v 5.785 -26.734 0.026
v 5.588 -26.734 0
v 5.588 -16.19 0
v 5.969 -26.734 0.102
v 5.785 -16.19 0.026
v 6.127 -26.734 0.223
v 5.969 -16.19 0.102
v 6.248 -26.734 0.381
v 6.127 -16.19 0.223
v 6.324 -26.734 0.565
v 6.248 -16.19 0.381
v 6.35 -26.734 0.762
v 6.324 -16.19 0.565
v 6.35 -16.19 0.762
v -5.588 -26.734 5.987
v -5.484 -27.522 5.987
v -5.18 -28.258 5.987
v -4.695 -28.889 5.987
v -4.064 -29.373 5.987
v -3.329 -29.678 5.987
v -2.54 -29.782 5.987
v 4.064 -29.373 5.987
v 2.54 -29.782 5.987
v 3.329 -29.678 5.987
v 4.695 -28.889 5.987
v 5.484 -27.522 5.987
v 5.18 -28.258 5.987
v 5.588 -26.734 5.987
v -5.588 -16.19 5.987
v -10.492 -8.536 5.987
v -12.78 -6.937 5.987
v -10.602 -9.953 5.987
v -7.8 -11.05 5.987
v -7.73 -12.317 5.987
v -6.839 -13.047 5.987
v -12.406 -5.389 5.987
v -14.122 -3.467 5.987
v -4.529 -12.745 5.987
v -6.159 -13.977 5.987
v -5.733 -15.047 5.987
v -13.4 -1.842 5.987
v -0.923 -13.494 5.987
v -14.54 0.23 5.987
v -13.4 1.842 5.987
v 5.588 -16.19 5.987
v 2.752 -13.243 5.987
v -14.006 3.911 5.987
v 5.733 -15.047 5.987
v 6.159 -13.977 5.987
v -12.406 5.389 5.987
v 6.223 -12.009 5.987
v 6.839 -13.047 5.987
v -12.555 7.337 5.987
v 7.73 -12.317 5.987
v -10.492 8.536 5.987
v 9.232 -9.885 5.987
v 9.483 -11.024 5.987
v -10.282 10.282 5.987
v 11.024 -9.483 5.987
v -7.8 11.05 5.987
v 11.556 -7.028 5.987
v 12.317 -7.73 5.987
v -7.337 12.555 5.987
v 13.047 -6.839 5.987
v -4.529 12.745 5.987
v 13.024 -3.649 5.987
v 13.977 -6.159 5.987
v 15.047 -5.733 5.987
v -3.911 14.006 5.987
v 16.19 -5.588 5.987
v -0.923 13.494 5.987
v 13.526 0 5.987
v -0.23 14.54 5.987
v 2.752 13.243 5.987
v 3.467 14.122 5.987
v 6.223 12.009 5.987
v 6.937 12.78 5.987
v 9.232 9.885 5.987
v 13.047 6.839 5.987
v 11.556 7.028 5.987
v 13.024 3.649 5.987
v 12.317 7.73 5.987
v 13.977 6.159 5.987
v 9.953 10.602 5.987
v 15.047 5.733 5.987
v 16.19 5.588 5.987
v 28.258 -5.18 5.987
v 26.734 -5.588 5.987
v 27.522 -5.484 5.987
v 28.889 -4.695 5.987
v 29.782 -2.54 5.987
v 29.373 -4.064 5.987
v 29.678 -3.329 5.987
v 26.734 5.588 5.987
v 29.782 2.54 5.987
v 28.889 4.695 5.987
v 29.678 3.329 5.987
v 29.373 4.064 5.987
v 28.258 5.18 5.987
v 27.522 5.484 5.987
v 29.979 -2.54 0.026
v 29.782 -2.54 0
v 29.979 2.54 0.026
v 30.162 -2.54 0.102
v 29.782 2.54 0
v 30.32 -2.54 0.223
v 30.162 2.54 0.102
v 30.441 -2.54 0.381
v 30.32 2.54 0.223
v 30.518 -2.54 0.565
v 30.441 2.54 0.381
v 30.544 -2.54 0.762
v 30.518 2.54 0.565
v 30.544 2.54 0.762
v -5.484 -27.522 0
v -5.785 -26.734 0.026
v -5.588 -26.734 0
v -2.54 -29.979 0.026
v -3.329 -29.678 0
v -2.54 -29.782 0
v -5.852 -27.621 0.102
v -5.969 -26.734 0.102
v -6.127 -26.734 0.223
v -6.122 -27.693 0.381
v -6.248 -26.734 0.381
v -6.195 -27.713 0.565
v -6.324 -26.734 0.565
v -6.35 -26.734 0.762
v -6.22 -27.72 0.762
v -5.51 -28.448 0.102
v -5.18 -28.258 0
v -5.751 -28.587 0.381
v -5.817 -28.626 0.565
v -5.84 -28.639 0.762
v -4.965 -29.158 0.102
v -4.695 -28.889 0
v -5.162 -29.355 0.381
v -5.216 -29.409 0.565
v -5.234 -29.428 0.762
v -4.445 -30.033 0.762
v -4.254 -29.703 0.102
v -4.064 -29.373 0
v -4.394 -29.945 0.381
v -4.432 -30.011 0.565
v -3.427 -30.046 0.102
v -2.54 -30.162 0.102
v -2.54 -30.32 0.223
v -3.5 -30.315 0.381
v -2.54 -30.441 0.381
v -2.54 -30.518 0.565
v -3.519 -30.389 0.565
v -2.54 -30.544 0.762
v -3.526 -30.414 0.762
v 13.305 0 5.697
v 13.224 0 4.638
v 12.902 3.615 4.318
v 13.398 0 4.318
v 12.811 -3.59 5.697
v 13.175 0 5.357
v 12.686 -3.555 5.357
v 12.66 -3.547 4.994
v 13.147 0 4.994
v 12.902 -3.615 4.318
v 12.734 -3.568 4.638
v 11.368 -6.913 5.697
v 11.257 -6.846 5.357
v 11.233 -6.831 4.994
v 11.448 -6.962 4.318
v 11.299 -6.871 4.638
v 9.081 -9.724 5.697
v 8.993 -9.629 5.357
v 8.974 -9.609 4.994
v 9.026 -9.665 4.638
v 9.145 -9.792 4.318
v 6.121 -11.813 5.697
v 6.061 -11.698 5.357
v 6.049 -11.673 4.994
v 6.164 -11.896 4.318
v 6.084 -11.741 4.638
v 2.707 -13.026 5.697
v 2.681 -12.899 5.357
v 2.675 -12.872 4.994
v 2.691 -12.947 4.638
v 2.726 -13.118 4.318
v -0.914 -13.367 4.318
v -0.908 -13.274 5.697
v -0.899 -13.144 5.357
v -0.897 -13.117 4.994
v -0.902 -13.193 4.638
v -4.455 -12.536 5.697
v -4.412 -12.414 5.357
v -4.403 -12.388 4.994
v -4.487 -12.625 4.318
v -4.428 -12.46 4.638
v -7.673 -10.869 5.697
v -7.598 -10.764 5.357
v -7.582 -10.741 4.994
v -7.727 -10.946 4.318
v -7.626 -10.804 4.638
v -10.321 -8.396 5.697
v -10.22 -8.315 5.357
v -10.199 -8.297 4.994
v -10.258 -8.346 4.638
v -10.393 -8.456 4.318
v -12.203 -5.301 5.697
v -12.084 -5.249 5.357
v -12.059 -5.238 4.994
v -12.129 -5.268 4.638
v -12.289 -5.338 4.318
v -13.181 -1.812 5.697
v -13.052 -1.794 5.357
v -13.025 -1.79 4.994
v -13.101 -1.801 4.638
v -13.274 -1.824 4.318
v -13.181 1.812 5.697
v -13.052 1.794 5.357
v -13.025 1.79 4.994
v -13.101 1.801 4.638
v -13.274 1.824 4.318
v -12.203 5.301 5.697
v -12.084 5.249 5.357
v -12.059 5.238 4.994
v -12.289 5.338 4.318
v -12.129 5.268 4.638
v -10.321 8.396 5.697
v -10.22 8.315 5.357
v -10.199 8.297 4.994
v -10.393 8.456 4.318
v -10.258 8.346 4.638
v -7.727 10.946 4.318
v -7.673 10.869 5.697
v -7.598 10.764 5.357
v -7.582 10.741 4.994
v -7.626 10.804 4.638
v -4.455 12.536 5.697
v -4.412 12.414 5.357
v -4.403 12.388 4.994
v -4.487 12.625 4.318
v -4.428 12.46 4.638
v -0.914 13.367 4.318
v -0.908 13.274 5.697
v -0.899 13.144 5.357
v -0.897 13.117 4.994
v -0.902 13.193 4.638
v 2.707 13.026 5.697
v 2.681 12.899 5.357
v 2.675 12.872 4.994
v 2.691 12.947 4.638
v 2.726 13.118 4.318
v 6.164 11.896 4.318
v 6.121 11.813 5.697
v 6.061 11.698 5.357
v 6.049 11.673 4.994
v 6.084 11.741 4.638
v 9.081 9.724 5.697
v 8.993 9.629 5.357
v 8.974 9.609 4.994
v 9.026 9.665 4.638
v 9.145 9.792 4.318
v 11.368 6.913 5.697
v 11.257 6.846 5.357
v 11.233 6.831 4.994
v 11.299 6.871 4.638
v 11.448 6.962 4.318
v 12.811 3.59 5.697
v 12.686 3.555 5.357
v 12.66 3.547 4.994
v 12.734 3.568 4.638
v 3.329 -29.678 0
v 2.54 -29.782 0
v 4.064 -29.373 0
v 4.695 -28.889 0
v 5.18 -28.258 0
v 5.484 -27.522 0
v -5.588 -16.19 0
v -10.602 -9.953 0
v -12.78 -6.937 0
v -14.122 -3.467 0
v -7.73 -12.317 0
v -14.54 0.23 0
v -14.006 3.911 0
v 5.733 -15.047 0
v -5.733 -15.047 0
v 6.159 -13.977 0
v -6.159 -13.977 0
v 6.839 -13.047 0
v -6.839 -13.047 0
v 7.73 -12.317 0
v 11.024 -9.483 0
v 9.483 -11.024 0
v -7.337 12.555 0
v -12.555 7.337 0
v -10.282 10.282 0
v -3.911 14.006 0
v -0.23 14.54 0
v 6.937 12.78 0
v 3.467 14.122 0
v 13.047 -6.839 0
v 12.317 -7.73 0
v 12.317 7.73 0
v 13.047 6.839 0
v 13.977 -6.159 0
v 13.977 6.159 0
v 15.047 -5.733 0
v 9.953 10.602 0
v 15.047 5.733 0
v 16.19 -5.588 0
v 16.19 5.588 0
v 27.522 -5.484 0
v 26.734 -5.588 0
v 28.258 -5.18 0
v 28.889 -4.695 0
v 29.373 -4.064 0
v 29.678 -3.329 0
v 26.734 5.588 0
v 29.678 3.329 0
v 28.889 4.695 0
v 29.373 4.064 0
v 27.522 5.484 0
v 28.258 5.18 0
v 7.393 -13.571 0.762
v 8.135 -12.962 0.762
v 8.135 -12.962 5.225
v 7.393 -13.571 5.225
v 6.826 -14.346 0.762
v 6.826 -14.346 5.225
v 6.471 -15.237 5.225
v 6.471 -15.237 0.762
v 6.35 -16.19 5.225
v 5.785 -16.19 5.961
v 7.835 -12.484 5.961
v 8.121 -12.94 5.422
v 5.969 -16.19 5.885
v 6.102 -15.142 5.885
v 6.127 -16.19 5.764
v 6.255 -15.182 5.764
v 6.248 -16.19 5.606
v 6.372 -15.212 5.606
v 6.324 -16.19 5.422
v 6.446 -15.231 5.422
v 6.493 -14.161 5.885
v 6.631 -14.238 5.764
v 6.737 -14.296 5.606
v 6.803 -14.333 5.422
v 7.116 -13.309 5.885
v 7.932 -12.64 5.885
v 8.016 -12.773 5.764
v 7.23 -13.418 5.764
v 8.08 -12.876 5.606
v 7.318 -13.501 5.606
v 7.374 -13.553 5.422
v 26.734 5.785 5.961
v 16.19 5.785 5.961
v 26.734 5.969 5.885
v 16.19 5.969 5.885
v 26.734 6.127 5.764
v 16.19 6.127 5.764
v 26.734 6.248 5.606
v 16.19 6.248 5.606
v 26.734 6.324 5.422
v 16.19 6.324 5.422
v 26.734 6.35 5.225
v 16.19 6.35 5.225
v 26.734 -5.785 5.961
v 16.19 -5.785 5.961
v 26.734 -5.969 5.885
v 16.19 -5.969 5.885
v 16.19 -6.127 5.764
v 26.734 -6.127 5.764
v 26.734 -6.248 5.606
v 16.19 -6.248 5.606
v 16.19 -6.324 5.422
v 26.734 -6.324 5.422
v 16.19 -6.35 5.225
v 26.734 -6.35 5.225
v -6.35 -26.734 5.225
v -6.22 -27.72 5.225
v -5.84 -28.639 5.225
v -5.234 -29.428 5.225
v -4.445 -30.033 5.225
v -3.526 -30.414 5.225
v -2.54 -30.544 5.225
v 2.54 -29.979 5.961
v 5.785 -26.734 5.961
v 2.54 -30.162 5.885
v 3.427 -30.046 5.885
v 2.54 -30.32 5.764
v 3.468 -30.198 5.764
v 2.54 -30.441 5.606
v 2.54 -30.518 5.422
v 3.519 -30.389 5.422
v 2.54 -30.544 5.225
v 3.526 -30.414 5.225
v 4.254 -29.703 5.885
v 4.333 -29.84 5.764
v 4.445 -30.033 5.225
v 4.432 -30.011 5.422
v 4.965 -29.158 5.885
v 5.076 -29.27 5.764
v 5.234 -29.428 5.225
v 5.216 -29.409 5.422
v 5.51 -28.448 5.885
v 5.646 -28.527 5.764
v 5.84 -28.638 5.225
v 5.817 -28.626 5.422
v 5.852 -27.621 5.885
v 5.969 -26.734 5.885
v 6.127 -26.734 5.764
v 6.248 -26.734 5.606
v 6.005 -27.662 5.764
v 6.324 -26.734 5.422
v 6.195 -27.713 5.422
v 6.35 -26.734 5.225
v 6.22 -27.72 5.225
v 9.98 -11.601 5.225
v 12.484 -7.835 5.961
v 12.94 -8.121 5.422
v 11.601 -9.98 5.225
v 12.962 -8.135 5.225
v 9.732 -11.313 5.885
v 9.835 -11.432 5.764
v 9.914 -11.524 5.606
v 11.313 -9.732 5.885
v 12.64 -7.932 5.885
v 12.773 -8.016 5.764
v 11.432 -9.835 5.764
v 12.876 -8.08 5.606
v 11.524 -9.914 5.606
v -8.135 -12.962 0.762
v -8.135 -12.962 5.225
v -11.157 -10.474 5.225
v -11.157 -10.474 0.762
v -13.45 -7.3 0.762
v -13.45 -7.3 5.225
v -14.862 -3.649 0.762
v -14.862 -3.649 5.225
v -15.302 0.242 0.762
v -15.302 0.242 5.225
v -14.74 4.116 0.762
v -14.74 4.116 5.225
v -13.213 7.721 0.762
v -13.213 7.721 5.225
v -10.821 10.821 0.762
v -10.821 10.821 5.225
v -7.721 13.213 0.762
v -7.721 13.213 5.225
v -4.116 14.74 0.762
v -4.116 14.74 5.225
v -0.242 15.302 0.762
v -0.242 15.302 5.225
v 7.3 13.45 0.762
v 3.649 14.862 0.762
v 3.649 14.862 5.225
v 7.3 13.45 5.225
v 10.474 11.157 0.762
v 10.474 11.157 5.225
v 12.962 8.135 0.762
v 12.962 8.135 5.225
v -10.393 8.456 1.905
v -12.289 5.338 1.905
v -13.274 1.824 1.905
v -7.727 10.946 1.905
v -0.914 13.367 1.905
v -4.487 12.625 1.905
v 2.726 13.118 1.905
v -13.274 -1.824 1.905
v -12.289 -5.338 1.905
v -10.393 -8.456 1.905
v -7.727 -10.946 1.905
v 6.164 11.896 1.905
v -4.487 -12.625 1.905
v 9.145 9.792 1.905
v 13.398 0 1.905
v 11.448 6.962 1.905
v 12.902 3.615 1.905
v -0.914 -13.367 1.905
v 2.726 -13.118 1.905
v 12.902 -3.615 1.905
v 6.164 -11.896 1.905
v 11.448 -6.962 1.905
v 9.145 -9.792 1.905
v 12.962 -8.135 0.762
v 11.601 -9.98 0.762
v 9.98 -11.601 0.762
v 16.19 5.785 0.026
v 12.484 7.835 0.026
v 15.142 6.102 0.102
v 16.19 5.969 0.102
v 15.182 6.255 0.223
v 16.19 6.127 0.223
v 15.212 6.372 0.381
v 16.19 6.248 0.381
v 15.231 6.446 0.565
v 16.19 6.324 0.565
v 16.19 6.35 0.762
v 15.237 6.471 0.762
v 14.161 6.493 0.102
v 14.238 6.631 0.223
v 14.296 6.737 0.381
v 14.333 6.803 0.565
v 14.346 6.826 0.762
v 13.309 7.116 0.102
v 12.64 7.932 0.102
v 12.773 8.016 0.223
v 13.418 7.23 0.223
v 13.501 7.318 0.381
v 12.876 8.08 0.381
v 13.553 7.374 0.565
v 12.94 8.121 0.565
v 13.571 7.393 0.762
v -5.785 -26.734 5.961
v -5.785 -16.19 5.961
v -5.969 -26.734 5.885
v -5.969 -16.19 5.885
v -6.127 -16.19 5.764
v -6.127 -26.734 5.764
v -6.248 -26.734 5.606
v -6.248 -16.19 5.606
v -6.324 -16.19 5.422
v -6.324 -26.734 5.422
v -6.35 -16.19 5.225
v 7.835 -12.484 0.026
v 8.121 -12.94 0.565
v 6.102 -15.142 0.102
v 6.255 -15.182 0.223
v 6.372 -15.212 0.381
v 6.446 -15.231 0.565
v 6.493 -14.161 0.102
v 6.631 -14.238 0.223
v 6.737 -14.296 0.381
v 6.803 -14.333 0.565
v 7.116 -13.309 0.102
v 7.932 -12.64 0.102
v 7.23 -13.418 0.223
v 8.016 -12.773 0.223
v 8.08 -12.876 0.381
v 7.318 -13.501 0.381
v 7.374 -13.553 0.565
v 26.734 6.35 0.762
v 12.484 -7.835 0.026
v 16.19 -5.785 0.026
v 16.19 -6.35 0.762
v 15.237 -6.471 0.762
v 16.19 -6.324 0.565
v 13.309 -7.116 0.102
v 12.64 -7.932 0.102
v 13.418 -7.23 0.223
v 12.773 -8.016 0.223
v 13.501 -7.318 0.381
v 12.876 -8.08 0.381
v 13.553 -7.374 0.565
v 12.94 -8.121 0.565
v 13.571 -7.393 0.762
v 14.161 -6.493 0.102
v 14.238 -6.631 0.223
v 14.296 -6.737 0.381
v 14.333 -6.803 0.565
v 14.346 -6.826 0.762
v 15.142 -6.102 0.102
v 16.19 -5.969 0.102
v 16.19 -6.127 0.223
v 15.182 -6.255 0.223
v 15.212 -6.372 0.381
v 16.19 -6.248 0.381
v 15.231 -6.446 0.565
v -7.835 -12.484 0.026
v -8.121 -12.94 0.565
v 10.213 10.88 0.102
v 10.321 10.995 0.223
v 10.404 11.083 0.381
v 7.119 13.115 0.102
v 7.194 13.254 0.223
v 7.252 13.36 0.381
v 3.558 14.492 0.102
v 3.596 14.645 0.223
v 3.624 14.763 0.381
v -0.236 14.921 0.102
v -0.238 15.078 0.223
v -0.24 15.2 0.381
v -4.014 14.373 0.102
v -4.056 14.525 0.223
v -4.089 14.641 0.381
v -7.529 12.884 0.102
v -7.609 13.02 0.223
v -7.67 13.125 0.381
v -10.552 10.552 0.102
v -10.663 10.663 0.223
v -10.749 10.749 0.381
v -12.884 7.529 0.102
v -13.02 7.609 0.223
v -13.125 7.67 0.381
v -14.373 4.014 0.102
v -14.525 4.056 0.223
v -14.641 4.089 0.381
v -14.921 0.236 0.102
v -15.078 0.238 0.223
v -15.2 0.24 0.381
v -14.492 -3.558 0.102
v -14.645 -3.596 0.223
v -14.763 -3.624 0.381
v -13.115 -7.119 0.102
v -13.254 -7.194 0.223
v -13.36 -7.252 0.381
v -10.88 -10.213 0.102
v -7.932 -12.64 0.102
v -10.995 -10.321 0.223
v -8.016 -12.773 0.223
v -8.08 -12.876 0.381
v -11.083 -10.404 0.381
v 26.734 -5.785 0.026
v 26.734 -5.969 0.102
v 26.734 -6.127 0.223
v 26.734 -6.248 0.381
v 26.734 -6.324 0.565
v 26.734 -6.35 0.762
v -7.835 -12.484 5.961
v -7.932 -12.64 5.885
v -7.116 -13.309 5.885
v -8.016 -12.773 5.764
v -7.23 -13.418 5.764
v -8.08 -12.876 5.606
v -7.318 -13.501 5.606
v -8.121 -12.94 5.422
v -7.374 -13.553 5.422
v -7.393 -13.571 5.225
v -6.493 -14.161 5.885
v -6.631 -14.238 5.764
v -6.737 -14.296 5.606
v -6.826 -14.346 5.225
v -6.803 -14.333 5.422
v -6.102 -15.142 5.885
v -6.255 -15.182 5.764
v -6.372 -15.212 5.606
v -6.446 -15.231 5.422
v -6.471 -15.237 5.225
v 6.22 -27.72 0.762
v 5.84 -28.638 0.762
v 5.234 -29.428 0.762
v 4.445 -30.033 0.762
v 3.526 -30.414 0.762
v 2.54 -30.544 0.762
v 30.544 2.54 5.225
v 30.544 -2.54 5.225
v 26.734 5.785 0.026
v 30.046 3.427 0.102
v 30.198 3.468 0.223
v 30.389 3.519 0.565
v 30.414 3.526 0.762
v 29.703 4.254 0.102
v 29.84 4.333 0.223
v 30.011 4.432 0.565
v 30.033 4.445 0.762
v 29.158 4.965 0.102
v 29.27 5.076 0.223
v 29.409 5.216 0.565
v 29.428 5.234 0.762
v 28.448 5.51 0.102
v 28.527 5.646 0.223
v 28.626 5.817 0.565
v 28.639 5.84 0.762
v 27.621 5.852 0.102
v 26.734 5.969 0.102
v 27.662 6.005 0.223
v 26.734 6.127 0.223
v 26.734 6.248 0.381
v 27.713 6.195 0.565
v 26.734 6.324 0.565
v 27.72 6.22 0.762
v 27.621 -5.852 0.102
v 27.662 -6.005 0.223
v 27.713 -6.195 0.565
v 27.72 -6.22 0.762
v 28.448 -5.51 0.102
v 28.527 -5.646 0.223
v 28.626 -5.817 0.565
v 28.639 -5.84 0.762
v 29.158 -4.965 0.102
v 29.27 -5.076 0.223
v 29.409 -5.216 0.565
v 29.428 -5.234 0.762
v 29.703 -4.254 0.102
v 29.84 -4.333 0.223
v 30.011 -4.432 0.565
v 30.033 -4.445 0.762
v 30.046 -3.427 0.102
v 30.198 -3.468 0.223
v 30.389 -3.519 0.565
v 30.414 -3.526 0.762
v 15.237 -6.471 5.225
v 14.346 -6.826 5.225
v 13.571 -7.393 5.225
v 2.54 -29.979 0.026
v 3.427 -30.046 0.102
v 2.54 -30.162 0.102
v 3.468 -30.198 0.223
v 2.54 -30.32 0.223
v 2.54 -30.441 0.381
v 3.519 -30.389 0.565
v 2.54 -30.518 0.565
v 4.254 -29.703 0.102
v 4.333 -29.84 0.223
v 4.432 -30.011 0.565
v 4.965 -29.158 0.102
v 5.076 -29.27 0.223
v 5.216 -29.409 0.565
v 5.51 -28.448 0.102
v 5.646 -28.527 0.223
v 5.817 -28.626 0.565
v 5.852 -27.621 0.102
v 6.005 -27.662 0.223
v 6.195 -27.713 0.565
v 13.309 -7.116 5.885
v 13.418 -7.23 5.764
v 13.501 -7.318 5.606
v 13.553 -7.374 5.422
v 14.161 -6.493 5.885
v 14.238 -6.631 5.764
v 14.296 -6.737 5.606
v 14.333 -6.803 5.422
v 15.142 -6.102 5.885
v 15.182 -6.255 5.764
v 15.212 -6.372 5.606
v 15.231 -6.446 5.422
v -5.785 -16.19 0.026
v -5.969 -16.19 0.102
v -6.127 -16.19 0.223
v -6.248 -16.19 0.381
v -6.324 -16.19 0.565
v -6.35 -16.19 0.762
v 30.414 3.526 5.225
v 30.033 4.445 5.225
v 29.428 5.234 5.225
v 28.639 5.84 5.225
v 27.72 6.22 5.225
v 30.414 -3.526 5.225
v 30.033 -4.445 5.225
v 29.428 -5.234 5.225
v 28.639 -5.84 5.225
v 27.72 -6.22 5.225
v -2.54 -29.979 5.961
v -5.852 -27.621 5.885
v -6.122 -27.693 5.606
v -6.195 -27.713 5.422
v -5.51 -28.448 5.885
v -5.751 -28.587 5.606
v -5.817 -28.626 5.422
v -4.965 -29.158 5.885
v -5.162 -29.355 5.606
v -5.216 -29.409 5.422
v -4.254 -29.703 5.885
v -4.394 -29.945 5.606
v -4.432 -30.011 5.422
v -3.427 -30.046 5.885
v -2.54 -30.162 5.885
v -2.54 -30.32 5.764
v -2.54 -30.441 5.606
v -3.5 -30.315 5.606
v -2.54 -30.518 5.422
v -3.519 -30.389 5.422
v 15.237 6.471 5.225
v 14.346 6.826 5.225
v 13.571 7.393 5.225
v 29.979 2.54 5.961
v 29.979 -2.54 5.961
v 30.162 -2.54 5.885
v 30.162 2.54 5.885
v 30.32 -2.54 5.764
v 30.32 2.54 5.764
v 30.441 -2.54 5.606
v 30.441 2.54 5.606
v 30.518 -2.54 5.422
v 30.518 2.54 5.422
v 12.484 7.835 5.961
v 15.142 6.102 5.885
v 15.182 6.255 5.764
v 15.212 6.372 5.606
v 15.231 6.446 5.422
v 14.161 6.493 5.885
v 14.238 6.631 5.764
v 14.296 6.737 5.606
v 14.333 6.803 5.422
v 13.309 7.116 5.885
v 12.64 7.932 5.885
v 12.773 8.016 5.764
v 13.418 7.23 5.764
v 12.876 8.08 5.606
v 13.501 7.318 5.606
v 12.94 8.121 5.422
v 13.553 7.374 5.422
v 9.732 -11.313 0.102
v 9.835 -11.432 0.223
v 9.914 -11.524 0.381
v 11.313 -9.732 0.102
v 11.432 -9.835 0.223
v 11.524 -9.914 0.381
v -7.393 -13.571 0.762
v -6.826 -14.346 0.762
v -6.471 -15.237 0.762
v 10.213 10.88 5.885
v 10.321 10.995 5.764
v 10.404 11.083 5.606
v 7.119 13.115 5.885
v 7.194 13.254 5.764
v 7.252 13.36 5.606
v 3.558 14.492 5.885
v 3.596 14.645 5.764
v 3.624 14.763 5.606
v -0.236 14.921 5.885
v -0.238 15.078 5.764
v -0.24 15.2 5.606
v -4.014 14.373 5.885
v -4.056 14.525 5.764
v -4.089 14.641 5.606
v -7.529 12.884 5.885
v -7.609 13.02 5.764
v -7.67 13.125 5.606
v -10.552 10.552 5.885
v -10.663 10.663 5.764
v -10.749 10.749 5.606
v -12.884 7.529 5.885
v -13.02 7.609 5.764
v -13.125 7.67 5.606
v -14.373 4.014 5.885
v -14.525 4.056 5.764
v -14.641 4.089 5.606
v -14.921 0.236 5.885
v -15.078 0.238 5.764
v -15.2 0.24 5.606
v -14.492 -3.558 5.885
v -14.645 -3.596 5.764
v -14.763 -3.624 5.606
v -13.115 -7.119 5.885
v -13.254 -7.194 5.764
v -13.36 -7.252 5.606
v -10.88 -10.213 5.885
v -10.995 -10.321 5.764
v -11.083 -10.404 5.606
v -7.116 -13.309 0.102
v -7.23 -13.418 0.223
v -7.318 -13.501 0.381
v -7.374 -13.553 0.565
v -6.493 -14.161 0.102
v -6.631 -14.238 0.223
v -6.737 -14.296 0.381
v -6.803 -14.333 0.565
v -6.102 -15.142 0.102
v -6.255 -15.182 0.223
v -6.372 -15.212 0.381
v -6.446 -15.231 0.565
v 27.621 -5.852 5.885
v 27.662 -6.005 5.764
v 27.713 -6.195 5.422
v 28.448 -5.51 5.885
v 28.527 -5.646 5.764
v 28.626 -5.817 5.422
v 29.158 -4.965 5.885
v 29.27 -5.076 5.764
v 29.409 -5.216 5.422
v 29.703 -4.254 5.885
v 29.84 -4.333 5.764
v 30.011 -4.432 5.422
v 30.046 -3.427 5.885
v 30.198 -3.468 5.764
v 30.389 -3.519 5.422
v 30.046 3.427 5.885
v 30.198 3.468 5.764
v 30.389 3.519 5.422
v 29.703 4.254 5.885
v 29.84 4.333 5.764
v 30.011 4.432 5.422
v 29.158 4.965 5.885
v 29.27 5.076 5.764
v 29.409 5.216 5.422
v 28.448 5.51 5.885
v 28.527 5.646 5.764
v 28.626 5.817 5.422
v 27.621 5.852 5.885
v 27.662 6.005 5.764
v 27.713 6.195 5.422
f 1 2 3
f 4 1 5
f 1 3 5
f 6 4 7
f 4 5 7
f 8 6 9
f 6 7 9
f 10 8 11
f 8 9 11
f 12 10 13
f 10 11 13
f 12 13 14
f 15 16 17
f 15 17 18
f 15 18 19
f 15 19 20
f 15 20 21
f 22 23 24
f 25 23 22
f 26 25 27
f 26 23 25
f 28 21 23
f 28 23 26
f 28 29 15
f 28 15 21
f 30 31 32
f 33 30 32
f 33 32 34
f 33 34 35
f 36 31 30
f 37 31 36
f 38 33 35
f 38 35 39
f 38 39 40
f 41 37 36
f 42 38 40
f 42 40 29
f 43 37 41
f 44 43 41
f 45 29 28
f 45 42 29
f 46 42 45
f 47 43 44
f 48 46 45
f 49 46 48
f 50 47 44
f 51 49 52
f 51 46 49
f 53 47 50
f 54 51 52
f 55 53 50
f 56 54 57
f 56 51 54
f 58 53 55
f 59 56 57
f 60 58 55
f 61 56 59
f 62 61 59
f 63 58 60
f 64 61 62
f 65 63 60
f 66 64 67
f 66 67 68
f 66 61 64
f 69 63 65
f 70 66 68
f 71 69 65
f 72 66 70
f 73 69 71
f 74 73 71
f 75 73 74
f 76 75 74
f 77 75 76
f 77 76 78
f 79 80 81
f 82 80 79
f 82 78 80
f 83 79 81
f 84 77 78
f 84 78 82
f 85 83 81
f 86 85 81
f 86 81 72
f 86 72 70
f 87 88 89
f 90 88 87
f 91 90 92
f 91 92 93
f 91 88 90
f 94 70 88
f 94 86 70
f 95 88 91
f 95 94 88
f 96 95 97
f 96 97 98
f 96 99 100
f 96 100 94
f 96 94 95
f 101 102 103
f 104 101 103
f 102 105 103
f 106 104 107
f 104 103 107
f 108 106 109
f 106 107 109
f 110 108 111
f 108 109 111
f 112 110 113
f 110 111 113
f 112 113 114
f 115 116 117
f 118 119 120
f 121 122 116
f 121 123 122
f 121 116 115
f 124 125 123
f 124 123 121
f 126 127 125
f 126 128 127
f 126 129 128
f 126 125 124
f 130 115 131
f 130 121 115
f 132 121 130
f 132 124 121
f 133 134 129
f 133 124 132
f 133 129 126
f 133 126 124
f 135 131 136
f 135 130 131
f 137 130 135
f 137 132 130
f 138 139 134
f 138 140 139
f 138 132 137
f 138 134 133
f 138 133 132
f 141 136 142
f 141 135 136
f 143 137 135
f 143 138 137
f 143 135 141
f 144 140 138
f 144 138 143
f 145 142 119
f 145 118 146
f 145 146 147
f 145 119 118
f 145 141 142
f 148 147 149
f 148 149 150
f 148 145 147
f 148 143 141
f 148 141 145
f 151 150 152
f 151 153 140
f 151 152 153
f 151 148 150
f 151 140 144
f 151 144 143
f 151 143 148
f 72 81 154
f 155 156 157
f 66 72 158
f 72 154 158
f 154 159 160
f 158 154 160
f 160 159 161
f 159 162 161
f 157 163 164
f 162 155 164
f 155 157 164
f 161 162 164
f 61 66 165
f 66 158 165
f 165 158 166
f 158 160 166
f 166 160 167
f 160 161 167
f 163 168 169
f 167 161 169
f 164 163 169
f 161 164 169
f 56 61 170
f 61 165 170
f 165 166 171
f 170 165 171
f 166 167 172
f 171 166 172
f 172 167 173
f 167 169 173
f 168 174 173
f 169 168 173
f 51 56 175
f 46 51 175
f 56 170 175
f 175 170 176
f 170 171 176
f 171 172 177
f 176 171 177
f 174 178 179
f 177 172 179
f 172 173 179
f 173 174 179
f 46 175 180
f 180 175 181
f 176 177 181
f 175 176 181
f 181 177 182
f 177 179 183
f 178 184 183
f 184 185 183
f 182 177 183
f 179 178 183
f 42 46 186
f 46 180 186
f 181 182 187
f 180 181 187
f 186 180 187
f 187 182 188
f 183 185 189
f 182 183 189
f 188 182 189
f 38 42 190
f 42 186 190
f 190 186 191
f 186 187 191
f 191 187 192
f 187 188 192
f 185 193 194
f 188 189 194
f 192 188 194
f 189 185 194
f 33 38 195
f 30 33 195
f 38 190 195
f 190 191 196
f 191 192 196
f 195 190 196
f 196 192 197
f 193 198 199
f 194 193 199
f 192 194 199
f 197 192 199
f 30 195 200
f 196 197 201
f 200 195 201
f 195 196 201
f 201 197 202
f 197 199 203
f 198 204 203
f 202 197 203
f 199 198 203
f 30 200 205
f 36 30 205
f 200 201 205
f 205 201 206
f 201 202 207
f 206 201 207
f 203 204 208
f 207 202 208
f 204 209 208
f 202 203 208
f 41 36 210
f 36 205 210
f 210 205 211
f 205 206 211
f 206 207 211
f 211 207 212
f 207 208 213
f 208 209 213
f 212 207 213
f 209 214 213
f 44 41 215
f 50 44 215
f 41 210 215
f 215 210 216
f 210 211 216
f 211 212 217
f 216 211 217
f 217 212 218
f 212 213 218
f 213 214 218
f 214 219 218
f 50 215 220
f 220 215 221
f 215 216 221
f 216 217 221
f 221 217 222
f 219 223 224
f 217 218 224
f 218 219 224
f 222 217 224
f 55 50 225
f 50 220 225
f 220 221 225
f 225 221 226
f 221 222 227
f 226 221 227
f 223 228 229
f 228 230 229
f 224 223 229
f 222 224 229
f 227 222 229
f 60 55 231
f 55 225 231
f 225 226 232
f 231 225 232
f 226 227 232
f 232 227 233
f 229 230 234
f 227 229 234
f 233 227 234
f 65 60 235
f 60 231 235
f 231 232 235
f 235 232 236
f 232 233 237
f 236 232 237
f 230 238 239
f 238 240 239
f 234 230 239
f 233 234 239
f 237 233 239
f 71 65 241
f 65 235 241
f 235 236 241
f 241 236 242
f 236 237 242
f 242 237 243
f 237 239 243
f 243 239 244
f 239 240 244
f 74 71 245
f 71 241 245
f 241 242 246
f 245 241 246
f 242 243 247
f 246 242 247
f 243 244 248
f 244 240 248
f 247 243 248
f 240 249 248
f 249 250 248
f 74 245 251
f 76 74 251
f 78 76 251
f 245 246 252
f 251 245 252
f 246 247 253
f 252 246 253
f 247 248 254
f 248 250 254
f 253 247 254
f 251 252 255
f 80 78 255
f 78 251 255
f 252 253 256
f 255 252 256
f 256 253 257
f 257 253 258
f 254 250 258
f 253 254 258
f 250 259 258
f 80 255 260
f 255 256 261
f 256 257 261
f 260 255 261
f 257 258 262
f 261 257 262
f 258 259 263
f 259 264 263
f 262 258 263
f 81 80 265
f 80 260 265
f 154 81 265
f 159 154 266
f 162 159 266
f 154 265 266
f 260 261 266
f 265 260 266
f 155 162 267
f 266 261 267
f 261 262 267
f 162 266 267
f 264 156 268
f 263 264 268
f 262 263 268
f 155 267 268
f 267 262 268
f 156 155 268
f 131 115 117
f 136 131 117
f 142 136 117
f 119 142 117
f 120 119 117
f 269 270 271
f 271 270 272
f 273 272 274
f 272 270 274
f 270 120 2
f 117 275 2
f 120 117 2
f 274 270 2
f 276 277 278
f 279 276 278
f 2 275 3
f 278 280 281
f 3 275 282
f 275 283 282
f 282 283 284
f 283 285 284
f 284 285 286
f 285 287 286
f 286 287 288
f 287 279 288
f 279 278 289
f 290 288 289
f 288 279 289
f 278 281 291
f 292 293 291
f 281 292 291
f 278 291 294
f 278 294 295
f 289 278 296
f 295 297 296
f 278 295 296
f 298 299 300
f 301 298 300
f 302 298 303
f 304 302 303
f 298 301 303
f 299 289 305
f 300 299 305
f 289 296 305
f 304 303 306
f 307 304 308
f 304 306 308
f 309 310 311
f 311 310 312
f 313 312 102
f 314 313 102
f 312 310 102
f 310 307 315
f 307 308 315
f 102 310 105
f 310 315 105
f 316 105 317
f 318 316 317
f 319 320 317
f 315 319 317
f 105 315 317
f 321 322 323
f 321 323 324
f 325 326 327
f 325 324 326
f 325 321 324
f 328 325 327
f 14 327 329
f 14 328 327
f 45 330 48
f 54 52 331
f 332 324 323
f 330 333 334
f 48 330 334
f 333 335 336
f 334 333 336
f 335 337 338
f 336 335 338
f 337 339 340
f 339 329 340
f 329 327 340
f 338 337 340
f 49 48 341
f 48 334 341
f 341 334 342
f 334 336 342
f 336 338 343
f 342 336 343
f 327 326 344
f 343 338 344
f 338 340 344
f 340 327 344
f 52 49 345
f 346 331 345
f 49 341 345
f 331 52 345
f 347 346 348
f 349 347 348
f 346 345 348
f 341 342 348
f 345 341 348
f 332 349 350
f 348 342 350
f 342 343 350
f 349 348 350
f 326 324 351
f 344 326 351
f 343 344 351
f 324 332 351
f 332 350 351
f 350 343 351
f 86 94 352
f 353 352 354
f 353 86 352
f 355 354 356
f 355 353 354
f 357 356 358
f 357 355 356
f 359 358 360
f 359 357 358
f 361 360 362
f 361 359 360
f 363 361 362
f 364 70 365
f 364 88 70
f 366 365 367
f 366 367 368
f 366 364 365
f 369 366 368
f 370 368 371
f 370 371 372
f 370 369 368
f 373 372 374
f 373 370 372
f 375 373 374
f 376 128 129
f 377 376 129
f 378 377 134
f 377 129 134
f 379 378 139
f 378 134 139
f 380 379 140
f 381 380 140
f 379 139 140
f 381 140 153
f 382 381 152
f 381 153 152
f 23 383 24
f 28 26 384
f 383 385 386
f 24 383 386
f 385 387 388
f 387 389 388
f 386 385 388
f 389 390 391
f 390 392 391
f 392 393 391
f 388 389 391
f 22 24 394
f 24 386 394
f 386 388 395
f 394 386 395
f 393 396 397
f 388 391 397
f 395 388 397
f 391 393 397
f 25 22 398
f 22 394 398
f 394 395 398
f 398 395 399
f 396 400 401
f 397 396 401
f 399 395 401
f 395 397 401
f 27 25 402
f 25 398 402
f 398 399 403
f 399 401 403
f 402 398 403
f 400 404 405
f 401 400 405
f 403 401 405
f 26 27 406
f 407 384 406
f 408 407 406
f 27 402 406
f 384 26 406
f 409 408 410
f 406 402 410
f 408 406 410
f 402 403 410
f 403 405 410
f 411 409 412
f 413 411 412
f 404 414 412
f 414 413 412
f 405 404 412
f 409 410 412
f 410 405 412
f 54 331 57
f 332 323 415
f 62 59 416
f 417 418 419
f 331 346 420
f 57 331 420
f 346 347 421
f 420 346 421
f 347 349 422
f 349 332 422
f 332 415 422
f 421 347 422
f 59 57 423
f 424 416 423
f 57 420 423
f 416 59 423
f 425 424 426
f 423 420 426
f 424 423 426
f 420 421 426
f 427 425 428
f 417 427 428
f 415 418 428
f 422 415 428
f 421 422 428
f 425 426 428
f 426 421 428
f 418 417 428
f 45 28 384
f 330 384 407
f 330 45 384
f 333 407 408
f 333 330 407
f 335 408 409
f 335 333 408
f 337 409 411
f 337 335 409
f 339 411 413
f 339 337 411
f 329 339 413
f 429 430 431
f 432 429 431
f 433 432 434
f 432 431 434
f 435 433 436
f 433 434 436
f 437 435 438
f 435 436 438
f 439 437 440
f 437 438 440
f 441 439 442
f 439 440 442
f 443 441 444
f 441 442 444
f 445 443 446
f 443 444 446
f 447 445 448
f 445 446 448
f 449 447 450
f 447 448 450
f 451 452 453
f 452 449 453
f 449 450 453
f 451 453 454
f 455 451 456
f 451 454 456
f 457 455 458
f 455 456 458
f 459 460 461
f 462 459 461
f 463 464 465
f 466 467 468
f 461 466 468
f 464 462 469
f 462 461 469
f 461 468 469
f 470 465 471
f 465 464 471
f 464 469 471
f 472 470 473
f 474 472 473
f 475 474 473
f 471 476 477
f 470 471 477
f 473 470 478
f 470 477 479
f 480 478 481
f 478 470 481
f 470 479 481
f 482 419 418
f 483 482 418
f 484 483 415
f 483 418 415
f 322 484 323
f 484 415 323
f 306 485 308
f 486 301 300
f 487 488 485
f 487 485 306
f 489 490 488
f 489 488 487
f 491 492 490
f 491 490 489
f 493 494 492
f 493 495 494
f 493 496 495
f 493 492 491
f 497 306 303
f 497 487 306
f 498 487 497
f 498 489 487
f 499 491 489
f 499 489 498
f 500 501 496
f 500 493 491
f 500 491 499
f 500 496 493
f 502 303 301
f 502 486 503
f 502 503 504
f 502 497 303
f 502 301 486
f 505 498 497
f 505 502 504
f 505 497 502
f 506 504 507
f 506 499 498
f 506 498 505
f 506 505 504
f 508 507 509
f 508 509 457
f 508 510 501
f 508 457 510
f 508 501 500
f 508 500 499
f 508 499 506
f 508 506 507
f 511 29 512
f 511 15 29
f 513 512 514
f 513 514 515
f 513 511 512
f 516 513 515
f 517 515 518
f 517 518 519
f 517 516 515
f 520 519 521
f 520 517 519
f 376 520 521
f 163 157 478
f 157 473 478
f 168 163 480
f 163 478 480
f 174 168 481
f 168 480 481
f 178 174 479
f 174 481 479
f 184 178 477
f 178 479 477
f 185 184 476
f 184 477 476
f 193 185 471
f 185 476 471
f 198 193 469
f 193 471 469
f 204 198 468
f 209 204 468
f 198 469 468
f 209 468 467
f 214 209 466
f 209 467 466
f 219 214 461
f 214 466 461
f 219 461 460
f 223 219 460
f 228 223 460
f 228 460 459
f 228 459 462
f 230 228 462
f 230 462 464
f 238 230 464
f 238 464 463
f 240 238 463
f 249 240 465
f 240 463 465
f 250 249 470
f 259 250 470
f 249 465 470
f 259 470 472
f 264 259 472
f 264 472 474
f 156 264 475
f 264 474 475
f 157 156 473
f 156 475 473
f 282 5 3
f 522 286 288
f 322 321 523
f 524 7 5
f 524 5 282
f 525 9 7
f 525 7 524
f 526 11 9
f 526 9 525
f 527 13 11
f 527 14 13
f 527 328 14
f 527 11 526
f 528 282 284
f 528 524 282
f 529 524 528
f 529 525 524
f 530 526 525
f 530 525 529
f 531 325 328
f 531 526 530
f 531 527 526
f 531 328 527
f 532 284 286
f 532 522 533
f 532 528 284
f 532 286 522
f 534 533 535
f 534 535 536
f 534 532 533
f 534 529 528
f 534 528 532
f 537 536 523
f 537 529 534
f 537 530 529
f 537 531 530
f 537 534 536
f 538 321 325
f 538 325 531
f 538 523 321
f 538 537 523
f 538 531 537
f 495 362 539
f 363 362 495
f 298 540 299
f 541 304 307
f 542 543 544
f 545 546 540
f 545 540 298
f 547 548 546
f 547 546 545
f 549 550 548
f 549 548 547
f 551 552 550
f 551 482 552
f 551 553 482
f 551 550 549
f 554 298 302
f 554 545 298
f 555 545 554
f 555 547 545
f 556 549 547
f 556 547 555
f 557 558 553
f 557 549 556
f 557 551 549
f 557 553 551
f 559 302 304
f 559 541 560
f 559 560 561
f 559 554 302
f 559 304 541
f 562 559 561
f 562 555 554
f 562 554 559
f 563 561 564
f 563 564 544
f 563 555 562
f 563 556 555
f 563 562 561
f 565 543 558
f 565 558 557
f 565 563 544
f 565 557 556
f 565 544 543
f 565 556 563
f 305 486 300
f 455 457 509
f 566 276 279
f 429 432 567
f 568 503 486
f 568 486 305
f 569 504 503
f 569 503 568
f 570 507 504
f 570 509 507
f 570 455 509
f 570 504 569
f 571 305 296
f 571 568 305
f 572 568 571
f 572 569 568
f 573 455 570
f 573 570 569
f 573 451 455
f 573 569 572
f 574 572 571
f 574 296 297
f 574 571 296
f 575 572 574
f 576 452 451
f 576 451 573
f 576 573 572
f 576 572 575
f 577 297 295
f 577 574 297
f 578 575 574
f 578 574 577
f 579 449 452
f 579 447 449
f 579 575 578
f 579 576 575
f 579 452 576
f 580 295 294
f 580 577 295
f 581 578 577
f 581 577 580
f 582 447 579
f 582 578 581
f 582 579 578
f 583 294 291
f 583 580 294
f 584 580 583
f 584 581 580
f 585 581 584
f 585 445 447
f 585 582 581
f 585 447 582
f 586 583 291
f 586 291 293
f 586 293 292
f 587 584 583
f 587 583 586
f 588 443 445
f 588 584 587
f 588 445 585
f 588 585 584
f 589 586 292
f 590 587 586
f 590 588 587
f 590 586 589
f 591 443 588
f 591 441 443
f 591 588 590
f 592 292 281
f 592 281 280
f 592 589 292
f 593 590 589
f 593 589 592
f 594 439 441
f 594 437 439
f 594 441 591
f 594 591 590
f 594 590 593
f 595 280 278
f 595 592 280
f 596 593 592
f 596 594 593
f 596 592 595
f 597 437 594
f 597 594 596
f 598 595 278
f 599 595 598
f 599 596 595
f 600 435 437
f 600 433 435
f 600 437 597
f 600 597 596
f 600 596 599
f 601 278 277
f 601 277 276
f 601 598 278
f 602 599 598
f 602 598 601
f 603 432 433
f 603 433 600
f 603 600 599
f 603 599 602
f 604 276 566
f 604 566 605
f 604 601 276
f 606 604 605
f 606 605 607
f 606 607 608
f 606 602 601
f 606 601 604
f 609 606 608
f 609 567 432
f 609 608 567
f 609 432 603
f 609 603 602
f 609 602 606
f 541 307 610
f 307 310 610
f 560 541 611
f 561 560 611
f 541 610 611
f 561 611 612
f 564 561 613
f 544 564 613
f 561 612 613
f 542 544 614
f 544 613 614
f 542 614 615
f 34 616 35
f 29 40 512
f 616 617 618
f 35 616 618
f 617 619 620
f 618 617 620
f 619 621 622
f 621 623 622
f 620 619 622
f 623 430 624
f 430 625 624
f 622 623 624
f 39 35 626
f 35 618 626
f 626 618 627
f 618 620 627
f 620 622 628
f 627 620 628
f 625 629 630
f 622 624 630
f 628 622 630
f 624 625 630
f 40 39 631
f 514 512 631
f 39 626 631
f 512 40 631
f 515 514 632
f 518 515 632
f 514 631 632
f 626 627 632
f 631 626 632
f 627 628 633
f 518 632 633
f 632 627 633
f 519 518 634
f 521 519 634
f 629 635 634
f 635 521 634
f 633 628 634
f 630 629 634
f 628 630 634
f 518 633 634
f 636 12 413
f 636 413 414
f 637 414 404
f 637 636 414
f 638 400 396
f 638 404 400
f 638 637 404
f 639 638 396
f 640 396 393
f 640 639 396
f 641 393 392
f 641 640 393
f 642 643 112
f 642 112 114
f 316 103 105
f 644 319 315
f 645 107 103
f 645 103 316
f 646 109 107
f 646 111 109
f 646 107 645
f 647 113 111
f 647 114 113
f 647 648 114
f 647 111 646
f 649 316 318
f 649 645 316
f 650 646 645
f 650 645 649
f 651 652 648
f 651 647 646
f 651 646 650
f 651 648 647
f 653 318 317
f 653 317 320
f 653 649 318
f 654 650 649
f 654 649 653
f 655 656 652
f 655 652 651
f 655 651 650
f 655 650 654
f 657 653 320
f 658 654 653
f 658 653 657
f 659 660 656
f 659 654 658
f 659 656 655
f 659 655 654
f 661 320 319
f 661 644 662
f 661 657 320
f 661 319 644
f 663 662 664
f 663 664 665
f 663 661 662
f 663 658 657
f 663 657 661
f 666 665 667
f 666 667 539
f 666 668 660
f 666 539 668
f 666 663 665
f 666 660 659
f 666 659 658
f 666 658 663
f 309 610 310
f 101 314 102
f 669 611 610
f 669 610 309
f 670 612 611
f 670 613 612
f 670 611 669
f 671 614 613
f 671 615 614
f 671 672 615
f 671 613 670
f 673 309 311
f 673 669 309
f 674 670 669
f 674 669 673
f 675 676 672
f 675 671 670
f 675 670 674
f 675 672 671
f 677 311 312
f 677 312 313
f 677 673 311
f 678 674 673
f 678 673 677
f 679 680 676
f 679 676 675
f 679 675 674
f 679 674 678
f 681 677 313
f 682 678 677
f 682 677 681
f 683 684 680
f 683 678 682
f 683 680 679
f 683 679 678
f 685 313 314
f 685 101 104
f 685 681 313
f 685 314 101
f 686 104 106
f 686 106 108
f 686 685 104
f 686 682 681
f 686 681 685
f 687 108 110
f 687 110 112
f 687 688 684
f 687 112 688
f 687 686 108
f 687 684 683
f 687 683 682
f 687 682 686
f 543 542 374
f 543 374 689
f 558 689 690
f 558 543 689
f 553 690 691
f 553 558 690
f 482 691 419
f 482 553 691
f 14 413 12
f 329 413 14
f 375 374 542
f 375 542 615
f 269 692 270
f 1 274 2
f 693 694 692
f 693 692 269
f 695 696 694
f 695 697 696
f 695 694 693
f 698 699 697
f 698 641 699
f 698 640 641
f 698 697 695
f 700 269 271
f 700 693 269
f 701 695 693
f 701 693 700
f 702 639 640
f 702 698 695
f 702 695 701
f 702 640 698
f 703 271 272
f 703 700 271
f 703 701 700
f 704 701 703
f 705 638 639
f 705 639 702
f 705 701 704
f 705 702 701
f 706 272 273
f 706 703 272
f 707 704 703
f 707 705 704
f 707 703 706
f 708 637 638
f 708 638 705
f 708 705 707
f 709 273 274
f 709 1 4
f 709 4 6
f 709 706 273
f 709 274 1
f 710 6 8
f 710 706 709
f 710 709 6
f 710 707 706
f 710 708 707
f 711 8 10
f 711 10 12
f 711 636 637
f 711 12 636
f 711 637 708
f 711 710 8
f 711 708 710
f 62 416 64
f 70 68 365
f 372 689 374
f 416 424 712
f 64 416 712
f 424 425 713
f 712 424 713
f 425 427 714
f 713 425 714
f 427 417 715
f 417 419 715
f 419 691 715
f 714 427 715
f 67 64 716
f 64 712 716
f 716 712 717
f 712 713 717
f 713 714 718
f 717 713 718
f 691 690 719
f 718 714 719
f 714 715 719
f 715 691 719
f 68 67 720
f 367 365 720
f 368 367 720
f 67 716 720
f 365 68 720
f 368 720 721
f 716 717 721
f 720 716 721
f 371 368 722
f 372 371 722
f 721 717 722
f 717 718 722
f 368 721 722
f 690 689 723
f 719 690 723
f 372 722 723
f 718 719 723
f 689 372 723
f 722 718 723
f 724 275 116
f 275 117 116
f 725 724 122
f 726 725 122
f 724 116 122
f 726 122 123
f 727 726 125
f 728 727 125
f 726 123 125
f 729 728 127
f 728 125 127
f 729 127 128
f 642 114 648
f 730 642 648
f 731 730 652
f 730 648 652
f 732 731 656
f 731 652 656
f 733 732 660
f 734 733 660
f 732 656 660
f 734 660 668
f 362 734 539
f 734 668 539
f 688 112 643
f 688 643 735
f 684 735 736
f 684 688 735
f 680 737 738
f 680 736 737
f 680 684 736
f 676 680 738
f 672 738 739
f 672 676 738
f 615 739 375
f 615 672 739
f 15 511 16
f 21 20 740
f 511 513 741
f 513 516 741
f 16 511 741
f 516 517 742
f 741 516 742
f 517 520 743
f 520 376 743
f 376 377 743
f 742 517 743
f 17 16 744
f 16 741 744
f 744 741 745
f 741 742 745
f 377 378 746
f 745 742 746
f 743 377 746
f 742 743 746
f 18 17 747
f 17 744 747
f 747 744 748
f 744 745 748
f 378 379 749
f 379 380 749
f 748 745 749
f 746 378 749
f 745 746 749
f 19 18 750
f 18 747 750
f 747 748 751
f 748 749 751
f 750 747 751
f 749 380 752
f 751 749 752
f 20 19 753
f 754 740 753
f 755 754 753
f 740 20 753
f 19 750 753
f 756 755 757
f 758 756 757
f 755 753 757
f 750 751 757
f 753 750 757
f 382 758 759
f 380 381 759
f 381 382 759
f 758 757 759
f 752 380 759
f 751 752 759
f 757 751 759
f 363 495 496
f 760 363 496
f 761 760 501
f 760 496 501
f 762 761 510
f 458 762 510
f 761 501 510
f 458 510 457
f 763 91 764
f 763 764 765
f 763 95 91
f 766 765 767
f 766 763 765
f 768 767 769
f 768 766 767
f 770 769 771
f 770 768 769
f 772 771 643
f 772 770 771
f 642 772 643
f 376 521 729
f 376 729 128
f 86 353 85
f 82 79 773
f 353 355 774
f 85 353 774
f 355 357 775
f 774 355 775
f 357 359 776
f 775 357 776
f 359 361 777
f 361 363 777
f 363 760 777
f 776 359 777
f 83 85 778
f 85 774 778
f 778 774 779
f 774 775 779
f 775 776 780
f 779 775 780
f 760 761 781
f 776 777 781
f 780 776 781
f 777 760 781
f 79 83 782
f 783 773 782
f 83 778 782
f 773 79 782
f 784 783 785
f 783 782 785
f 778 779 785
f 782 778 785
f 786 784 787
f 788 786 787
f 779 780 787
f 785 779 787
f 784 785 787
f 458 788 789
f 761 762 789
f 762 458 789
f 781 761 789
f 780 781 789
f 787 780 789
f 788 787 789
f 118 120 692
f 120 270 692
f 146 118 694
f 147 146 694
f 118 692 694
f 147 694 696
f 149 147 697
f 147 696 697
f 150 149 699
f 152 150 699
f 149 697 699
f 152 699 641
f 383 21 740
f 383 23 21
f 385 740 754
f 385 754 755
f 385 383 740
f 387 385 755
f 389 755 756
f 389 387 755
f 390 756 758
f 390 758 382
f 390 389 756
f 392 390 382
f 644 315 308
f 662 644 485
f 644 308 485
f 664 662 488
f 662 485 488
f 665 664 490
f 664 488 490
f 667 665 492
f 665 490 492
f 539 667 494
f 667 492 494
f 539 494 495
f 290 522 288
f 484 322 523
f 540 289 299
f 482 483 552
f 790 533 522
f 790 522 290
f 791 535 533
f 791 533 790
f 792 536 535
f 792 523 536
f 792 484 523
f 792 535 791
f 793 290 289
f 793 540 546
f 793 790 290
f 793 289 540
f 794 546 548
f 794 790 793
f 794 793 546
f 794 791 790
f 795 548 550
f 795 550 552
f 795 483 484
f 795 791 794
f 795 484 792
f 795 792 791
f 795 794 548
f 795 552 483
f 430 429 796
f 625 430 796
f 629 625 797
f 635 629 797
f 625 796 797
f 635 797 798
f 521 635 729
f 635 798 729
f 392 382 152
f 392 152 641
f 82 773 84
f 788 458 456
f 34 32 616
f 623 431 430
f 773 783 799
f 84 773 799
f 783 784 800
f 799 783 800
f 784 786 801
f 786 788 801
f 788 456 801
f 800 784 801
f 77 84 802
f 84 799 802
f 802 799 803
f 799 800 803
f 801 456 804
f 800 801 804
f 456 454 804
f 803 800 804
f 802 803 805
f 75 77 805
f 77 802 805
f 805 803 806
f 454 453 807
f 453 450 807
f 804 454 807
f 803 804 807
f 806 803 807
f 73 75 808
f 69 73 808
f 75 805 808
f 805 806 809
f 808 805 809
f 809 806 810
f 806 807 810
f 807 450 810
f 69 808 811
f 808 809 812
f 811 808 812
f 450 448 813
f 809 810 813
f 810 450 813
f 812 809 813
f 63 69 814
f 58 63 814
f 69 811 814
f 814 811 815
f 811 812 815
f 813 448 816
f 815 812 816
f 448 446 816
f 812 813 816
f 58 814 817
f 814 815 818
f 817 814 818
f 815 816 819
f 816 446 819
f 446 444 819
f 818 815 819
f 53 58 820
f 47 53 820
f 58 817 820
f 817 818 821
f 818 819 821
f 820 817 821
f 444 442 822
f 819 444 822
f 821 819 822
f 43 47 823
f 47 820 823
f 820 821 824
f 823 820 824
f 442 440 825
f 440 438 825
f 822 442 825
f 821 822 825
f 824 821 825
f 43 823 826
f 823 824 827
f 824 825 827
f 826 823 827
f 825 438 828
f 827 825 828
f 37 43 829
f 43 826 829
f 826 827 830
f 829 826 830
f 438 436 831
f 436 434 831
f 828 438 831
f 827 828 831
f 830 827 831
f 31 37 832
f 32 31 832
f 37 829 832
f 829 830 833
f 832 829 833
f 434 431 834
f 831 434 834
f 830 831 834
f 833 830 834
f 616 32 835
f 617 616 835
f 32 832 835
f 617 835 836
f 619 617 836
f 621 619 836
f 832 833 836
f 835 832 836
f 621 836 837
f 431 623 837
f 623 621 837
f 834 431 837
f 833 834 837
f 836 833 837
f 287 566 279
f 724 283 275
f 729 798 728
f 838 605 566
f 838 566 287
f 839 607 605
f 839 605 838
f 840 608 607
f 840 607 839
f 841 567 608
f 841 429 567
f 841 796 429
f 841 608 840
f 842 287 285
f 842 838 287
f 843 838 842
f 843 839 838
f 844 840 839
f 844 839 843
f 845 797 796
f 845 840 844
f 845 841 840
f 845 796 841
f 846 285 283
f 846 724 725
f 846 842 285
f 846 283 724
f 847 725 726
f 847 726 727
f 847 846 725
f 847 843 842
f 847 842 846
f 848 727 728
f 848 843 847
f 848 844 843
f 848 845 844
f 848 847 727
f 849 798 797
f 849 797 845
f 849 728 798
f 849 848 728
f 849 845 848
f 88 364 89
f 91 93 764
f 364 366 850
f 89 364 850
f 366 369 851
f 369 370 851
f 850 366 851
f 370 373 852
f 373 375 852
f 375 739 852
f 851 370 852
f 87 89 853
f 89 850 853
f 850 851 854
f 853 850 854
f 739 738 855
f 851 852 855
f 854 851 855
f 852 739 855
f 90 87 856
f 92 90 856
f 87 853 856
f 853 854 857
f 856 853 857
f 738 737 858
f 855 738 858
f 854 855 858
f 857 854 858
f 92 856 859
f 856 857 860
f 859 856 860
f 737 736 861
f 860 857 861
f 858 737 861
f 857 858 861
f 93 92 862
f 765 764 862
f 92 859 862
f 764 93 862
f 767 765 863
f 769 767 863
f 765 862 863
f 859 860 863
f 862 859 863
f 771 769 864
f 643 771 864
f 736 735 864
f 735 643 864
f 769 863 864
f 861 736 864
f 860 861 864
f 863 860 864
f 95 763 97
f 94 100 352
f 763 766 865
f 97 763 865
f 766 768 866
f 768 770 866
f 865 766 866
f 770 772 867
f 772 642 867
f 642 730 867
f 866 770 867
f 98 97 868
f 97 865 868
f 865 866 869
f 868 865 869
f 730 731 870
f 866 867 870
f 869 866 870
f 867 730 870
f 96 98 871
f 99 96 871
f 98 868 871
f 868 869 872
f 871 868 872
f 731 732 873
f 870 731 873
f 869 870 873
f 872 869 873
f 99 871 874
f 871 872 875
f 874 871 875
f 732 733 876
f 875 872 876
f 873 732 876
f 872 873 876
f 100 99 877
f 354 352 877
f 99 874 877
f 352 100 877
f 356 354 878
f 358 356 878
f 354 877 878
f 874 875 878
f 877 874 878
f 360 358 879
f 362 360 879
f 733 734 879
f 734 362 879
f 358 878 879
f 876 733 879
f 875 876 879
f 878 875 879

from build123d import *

# Parameters (mm, degrees)
F3_DEPTH = 5.9869614104
F4_R     = 3.81
F5_R     = 0.762


with BuildPart() as f1:
    # F0 (on Front) → F1 (revolve)
    with BuildSketch(Plane.XZ):
        with BuildLine():
            Line((15.3035, 0), (15.3035, 4.1730385896))
            ThreePointArc((15.3035, 4.1730385896), (14.3181376493, 3.8136610654), (13.3985, 4.318))
            Line((13.3985, 4.318), (13.3985, 1.905))
            Line((13.3985, 1.905), (0, 1.905))
            Line((0, 1.905), (0, 0))
            Line((0, 0), (15.3035, 0))
        make_face()
        with BuildLine():
            ThreePointArc((13.3985, 4.318), (14.3181376493, 3.8136610654), (15.3035, 4.1730385896))
            Line((15.3035, 4.1730385896), (15.3035, 5.9869614104))
            Line((15.3035, 5.9869614104), (13.5255, 5.9869614104))
            ThreePointArc((13.5255, 5.9869614104), (13.1481610654, 5.1763623507), (13.3985, 4.318))
        make_face()
    revolve(axis=Axis((0, 0, 4.2298094004), (0, 0, -1)))

    # F2 (on face) → F3 (join, through all)
    with BuildSketch(Plane.XY.offset(5.9869614104)):
        with BuildLine():
            Line((30.5435, -6.35), (30.5435, 6.35))
            Line((30.5435, 6.35), (13.9238863917, 6.35))
            ThreePointArc((13.9238863917, 6.35), (15.3035, 0), (13.9238863917, -6.35))
            Line((13.9238863917, -6.35), (30.5435, -6.35))
        make_face()
        with BuildLine():
            Line((-6.35, -30.5435), (6.35, -30.5435))
            Line((6.35, -30.5435), (6.35, -13.9238863917))
            ThreePointArc((6.35, -13.9238863917), (0, -15.3035), (-6.35, -13.9238863917))
            Line((-6.35, -13.9238863917), (-6.35, -30.5435))
        make_face()
    extrude(amount=-F3_DEPTH)

    # F4
    f4_edges = [f1.edges().sort_by_distance(p)[0] for p in [
        (-6.35, -30.5435, 2.993481),
        (-6.35, -13.923886, 2.993481),
        (6.35, -30.5435, 2.993481),
        (6.35, -13.923886, 2.993481),
        (13.923886, -6.35, 2.993481),
        (30.5435, -6.35, 2.993481),
        (30.5435, 6.35, 2.993481),
        (13.923886, 6.35, 2.993481),
    ]]
    fillet(f4_edges, radius=F4_R)

    # F5
    f5_edges = [f1.edges().sort_by_distance(p)[0] for p in [
        (0, -30.5435, 5.986961),
        (0, -30.5435, 0),
    ]]
    fillet(f5_edges, radius=F5_R)


solid = f1.part
